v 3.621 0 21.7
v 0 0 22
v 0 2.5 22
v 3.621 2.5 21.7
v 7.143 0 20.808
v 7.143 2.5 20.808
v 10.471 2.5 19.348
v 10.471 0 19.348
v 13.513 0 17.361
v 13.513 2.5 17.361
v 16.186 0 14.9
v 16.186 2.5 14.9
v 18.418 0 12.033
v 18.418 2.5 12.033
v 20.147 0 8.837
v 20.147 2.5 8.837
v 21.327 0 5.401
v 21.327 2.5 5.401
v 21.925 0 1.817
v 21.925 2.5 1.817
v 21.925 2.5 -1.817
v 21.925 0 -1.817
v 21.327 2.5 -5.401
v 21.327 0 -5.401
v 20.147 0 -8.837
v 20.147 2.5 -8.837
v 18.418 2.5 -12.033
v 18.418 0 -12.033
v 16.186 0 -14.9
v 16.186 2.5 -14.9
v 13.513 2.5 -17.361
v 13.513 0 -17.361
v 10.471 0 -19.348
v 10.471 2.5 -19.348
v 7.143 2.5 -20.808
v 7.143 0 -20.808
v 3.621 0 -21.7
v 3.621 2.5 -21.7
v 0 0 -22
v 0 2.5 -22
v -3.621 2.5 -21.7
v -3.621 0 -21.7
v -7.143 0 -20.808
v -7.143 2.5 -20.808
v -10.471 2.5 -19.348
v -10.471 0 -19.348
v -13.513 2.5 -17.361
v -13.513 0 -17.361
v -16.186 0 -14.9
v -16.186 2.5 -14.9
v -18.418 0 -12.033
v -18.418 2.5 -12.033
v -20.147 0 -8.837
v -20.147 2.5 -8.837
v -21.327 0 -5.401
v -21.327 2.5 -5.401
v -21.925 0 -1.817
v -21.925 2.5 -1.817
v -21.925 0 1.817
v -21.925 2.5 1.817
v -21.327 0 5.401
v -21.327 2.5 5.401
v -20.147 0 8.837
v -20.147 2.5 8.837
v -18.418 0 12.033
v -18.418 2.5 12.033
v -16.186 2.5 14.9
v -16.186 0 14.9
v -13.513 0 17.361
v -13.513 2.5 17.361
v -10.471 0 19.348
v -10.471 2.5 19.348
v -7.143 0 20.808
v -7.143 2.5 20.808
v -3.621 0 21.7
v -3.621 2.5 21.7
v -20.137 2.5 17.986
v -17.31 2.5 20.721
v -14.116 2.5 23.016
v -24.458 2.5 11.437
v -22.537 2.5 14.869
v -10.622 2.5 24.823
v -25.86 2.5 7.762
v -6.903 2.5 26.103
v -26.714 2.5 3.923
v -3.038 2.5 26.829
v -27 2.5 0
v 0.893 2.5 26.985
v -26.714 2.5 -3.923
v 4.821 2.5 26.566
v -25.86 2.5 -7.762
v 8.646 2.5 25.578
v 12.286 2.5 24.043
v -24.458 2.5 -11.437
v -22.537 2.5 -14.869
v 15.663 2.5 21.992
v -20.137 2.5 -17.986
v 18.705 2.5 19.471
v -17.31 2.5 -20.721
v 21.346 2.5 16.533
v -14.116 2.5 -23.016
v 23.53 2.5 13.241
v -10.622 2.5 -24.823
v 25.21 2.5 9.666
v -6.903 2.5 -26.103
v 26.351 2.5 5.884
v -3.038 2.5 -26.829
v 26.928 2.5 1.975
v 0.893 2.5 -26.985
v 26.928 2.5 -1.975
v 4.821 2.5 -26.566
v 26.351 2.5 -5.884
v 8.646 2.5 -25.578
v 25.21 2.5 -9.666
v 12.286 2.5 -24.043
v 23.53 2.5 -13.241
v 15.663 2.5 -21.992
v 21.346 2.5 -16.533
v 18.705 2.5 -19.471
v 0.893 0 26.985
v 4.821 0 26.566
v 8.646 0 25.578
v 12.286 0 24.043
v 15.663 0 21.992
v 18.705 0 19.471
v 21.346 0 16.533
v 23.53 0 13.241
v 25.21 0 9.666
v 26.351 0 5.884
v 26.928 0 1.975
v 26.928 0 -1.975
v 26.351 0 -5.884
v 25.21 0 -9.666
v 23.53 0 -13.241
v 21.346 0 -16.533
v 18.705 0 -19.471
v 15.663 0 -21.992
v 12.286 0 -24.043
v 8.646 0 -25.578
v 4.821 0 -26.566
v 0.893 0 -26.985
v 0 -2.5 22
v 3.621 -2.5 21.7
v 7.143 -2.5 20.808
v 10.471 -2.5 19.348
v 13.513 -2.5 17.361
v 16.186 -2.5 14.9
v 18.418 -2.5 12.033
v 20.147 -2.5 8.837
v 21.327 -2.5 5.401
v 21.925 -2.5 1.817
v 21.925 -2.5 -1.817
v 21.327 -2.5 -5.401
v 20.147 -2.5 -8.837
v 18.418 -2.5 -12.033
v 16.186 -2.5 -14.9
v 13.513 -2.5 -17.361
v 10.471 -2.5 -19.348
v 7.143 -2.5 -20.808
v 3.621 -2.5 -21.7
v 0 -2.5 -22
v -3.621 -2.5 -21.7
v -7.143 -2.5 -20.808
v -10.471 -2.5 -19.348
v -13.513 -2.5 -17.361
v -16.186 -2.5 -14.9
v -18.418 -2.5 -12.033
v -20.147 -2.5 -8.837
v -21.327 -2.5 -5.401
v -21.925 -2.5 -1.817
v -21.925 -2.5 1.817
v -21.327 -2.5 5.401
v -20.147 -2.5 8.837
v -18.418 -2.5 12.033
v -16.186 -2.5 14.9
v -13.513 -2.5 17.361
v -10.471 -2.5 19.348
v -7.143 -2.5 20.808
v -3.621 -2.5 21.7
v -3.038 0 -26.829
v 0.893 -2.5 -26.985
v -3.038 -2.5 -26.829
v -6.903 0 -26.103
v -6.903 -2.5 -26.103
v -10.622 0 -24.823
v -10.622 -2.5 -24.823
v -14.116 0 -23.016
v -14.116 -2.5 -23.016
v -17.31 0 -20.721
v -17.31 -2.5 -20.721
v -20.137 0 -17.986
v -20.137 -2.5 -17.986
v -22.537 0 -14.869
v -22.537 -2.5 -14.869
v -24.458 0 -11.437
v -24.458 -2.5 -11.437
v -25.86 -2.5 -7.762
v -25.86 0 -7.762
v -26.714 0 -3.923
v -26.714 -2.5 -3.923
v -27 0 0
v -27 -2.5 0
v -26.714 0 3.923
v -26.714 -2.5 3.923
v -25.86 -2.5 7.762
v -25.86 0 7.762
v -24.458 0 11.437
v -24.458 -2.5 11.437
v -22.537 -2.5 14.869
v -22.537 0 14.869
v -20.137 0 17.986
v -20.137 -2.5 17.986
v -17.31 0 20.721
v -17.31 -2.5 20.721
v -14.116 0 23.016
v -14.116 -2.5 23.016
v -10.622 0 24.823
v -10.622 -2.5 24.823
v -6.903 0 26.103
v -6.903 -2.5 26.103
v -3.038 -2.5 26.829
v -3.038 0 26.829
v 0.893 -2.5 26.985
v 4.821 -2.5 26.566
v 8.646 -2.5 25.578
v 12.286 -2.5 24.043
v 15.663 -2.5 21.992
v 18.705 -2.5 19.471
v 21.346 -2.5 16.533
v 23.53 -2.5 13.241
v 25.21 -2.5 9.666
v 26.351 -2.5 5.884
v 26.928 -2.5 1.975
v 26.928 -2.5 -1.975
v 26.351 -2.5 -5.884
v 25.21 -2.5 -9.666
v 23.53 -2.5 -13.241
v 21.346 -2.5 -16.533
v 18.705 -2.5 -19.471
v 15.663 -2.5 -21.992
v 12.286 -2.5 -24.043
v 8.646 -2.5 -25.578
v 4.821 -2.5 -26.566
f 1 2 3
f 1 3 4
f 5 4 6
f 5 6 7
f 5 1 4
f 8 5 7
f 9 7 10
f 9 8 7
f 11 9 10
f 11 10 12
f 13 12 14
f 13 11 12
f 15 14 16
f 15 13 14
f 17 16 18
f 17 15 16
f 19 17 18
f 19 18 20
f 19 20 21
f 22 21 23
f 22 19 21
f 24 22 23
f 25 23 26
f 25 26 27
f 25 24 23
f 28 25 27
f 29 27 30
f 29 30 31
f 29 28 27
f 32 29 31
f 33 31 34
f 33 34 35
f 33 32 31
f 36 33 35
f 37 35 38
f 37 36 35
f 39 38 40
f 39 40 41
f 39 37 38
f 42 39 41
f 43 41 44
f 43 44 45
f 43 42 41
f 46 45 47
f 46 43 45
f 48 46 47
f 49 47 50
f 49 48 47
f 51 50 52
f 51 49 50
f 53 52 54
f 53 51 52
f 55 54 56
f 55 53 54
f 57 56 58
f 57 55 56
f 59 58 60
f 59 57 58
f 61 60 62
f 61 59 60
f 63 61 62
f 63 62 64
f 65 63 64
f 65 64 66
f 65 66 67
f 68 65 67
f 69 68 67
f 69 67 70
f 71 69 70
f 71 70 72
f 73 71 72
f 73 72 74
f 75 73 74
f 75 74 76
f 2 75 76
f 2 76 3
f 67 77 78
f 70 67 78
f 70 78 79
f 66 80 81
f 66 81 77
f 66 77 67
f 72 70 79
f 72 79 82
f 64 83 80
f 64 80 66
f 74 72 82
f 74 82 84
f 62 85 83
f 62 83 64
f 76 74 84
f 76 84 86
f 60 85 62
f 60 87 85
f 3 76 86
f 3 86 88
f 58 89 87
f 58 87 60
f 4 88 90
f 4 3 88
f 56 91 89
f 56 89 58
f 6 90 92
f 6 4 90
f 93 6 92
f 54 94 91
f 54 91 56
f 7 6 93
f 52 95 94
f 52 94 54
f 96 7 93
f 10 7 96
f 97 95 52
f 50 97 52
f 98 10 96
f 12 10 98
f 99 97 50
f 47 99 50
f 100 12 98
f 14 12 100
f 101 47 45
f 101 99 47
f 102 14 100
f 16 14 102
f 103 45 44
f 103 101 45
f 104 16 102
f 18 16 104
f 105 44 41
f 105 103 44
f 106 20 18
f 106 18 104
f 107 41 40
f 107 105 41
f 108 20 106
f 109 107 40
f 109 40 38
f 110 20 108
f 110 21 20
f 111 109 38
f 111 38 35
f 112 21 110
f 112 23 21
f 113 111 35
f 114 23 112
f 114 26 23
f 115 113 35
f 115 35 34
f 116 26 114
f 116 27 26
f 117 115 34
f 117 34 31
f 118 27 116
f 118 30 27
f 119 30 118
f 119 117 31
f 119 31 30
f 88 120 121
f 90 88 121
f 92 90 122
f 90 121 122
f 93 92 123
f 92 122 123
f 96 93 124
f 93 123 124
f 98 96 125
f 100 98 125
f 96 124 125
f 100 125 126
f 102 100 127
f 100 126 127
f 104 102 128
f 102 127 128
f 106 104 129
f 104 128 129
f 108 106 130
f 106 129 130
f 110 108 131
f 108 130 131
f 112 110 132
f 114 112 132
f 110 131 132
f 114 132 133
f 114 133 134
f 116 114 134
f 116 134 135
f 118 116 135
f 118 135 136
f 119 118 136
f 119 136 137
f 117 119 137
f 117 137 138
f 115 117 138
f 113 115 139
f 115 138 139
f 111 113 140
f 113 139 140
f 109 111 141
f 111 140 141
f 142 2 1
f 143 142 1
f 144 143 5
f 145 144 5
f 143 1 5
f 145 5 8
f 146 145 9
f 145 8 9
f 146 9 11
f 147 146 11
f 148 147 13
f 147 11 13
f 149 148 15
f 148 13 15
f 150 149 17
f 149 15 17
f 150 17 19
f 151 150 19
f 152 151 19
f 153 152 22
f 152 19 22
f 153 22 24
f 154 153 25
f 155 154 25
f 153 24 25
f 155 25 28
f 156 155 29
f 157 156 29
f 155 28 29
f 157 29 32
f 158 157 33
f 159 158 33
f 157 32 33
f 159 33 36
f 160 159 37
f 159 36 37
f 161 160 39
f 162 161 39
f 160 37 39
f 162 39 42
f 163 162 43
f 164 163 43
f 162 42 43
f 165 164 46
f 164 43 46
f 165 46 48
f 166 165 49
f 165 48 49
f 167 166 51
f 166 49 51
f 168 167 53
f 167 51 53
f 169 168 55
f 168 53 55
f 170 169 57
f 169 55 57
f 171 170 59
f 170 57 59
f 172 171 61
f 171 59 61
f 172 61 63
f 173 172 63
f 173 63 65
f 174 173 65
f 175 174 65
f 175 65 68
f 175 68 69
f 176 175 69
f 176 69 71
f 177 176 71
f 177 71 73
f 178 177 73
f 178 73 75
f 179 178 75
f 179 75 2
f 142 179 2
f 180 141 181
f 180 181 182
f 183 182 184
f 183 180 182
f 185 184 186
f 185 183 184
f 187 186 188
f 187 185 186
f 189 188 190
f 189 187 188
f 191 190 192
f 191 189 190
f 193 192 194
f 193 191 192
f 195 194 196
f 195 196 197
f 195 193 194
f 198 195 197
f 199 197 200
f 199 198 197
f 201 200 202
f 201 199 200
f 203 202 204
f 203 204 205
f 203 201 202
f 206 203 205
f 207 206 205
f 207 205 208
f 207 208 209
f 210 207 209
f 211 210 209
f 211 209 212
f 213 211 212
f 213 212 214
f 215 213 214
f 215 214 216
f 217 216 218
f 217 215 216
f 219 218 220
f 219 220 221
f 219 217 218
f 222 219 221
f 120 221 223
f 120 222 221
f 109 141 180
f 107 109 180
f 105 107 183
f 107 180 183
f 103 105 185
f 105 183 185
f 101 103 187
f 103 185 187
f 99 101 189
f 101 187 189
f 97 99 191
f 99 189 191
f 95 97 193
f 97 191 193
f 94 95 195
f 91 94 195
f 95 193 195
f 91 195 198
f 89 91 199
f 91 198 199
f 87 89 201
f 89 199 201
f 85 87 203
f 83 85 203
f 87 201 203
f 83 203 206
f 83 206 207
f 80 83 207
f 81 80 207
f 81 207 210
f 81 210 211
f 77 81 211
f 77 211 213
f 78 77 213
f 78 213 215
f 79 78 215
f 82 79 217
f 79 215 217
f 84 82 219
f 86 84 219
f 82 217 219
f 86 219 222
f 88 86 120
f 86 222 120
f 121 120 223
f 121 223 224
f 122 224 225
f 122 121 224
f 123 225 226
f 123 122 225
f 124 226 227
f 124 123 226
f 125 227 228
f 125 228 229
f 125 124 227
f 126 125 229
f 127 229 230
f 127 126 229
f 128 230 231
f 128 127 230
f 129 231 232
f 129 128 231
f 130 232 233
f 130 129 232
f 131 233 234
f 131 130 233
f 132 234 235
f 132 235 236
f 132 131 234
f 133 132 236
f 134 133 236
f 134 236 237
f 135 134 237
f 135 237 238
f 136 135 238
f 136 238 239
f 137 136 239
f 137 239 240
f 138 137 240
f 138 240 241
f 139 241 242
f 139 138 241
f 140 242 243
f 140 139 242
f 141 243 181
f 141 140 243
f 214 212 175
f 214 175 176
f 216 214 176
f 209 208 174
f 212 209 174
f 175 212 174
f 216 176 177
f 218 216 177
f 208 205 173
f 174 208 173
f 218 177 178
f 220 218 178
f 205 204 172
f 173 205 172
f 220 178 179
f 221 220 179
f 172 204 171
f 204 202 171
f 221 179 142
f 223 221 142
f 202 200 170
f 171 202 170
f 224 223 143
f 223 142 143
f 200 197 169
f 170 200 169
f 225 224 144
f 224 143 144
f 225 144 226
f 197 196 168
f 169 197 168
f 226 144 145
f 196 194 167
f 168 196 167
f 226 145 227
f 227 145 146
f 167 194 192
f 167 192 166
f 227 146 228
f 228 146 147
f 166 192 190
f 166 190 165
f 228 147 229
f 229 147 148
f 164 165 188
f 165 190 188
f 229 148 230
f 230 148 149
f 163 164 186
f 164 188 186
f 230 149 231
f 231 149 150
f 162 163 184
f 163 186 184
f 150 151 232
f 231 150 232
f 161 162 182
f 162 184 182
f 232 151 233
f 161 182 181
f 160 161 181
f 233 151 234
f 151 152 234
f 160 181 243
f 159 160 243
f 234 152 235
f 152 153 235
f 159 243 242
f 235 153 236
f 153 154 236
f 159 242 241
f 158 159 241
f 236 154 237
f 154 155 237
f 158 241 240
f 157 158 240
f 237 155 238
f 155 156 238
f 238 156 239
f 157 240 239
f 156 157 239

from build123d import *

# Parameters (mm, degrees)
SKETCH_1_R      = 22
EXTRUDE_1_DEPTH = 2.5


with BuildPart() as part:
    # 草圖1 → 填料-伸長1 (new, symmetric)
    with BuildSketch(Plane(origin=(0, 0, 0), x_dir=(1, 0, 0), z_dir=(0, 1, 0))):
        with BuildLine():
            ThreePointArc((0.892561983, 26.985242877), (-27, 0), (0.892561983, -26.985242877))
            ThreePointArc((0.892561983, -26.985242877), (27, 0), (0.892561983, 26.985242877))
        make_face()
        with Locations(Location((0, 0, 0), (0, 0, 270))):
            Circle(SKETCH_1_R, mode=Mode.SUBTRACT)
    extrude(amount=EXTRUDE_1_DEPTH, both=True)


solid = part.part
